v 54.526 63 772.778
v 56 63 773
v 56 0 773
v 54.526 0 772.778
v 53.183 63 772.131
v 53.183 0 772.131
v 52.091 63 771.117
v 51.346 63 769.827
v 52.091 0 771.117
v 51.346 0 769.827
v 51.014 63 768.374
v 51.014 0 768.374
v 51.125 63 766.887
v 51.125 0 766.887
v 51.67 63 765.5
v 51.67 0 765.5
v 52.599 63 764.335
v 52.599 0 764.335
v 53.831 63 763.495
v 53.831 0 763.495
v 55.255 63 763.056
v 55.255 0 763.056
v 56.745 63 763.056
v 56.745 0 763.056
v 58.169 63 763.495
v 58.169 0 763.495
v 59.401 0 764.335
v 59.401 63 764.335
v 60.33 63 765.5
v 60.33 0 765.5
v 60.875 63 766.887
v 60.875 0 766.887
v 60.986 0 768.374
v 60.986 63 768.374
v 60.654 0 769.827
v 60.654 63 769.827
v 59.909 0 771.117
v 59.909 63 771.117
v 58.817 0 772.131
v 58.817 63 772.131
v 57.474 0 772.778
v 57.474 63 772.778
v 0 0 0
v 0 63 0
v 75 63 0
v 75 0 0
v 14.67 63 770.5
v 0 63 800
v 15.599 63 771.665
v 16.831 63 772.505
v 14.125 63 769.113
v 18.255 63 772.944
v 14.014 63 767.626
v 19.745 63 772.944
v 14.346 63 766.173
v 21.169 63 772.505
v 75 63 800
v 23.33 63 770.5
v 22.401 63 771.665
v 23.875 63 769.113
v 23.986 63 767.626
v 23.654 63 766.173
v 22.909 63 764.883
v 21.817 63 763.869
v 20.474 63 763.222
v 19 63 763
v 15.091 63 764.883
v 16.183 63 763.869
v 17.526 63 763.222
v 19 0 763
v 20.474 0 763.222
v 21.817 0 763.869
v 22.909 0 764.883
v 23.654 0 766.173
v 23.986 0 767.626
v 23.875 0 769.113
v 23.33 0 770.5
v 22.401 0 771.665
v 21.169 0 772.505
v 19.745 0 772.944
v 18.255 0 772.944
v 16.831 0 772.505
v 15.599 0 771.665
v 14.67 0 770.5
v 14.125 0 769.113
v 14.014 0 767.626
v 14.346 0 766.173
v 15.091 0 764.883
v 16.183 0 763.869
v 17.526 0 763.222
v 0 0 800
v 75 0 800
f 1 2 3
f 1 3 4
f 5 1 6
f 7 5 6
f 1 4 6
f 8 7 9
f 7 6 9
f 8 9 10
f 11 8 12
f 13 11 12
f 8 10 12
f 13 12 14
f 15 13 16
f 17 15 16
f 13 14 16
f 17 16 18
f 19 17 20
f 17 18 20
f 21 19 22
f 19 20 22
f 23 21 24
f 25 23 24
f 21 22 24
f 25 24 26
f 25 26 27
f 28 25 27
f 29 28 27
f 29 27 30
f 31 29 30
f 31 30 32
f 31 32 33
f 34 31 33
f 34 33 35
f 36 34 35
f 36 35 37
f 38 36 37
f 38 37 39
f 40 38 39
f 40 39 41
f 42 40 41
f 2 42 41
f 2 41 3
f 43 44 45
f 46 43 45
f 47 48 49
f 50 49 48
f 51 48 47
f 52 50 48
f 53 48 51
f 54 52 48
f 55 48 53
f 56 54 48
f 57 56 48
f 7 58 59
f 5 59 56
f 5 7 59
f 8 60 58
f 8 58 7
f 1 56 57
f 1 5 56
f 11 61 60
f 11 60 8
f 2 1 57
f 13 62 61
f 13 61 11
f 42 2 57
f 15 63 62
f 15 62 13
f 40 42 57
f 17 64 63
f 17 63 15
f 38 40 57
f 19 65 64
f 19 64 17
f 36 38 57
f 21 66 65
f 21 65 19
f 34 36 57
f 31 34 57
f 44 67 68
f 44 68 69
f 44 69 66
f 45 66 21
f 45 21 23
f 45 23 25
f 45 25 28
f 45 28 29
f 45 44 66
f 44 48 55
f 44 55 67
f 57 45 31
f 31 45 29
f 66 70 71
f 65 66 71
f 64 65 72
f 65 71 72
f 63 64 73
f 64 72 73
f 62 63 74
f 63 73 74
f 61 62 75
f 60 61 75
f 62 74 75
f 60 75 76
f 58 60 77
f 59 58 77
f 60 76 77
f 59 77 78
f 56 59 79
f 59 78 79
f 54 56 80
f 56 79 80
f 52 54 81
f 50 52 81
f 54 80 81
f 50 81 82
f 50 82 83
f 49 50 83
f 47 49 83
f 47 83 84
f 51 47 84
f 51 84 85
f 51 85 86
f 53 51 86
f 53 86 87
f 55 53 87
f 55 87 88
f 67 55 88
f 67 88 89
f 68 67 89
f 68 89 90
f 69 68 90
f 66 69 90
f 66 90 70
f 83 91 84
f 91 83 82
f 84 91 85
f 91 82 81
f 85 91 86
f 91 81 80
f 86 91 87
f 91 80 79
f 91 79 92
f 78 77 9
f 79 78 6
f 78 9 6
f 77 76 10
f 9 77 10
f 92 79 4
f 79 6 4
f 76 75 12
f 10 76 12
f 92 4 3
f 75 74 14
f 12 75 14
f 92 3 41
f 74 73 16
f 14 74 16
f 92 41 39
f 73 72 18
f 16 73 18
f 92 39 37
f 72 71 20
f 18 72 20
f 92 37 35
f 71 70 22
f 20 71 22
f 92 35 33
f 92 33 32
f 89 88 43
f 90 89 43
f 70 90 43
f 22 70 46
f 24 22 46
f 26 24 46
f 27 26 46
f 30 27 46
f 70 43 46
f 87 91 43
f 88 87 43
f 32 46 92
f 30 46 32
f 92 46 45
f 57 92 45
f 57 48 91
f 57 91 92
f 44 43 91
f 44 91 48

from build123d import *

# Parameters (mm, degrees)
ESQUISSE1_W             = 75
ESQUISSE1_H             = 63
BOSS_EXTRU_1_DEPTH      = 800
ESQUISSE2_R             = 5
ENL_V_MAT_EXTRU_1_DEPTH = 806.973944988


with BuildPart() as part:
    # Esquisse1 → Boss.-Extru.1 (new body)
    with BuildSketch(Plane.XY):
        with Locations((37.5, 31.5)):
            Rectangle(ESQUISSE1_W, ESQUISSE1_H)
    extrude(amount=BOSS_EXTRU_1_DEPTH)

    # Esquisse2 → Enlèv. mat.-Extru.1 (cut, through all)
    with BuildSketch(Plane.XZ):
        with Locations(Location((19, 768, 0), (0, 0, 270))):
            Circle(ESQUISSE2_R)
        with Locations(Location((56, 768, 0), (0, 0, 90))):
            Circle(ESQUISSE2_R)
    extrude(amount=-ENL_V_MAT_EXTRU_1_DEPTH, mode=Mode.SUBTRACT)


solid = part.part
